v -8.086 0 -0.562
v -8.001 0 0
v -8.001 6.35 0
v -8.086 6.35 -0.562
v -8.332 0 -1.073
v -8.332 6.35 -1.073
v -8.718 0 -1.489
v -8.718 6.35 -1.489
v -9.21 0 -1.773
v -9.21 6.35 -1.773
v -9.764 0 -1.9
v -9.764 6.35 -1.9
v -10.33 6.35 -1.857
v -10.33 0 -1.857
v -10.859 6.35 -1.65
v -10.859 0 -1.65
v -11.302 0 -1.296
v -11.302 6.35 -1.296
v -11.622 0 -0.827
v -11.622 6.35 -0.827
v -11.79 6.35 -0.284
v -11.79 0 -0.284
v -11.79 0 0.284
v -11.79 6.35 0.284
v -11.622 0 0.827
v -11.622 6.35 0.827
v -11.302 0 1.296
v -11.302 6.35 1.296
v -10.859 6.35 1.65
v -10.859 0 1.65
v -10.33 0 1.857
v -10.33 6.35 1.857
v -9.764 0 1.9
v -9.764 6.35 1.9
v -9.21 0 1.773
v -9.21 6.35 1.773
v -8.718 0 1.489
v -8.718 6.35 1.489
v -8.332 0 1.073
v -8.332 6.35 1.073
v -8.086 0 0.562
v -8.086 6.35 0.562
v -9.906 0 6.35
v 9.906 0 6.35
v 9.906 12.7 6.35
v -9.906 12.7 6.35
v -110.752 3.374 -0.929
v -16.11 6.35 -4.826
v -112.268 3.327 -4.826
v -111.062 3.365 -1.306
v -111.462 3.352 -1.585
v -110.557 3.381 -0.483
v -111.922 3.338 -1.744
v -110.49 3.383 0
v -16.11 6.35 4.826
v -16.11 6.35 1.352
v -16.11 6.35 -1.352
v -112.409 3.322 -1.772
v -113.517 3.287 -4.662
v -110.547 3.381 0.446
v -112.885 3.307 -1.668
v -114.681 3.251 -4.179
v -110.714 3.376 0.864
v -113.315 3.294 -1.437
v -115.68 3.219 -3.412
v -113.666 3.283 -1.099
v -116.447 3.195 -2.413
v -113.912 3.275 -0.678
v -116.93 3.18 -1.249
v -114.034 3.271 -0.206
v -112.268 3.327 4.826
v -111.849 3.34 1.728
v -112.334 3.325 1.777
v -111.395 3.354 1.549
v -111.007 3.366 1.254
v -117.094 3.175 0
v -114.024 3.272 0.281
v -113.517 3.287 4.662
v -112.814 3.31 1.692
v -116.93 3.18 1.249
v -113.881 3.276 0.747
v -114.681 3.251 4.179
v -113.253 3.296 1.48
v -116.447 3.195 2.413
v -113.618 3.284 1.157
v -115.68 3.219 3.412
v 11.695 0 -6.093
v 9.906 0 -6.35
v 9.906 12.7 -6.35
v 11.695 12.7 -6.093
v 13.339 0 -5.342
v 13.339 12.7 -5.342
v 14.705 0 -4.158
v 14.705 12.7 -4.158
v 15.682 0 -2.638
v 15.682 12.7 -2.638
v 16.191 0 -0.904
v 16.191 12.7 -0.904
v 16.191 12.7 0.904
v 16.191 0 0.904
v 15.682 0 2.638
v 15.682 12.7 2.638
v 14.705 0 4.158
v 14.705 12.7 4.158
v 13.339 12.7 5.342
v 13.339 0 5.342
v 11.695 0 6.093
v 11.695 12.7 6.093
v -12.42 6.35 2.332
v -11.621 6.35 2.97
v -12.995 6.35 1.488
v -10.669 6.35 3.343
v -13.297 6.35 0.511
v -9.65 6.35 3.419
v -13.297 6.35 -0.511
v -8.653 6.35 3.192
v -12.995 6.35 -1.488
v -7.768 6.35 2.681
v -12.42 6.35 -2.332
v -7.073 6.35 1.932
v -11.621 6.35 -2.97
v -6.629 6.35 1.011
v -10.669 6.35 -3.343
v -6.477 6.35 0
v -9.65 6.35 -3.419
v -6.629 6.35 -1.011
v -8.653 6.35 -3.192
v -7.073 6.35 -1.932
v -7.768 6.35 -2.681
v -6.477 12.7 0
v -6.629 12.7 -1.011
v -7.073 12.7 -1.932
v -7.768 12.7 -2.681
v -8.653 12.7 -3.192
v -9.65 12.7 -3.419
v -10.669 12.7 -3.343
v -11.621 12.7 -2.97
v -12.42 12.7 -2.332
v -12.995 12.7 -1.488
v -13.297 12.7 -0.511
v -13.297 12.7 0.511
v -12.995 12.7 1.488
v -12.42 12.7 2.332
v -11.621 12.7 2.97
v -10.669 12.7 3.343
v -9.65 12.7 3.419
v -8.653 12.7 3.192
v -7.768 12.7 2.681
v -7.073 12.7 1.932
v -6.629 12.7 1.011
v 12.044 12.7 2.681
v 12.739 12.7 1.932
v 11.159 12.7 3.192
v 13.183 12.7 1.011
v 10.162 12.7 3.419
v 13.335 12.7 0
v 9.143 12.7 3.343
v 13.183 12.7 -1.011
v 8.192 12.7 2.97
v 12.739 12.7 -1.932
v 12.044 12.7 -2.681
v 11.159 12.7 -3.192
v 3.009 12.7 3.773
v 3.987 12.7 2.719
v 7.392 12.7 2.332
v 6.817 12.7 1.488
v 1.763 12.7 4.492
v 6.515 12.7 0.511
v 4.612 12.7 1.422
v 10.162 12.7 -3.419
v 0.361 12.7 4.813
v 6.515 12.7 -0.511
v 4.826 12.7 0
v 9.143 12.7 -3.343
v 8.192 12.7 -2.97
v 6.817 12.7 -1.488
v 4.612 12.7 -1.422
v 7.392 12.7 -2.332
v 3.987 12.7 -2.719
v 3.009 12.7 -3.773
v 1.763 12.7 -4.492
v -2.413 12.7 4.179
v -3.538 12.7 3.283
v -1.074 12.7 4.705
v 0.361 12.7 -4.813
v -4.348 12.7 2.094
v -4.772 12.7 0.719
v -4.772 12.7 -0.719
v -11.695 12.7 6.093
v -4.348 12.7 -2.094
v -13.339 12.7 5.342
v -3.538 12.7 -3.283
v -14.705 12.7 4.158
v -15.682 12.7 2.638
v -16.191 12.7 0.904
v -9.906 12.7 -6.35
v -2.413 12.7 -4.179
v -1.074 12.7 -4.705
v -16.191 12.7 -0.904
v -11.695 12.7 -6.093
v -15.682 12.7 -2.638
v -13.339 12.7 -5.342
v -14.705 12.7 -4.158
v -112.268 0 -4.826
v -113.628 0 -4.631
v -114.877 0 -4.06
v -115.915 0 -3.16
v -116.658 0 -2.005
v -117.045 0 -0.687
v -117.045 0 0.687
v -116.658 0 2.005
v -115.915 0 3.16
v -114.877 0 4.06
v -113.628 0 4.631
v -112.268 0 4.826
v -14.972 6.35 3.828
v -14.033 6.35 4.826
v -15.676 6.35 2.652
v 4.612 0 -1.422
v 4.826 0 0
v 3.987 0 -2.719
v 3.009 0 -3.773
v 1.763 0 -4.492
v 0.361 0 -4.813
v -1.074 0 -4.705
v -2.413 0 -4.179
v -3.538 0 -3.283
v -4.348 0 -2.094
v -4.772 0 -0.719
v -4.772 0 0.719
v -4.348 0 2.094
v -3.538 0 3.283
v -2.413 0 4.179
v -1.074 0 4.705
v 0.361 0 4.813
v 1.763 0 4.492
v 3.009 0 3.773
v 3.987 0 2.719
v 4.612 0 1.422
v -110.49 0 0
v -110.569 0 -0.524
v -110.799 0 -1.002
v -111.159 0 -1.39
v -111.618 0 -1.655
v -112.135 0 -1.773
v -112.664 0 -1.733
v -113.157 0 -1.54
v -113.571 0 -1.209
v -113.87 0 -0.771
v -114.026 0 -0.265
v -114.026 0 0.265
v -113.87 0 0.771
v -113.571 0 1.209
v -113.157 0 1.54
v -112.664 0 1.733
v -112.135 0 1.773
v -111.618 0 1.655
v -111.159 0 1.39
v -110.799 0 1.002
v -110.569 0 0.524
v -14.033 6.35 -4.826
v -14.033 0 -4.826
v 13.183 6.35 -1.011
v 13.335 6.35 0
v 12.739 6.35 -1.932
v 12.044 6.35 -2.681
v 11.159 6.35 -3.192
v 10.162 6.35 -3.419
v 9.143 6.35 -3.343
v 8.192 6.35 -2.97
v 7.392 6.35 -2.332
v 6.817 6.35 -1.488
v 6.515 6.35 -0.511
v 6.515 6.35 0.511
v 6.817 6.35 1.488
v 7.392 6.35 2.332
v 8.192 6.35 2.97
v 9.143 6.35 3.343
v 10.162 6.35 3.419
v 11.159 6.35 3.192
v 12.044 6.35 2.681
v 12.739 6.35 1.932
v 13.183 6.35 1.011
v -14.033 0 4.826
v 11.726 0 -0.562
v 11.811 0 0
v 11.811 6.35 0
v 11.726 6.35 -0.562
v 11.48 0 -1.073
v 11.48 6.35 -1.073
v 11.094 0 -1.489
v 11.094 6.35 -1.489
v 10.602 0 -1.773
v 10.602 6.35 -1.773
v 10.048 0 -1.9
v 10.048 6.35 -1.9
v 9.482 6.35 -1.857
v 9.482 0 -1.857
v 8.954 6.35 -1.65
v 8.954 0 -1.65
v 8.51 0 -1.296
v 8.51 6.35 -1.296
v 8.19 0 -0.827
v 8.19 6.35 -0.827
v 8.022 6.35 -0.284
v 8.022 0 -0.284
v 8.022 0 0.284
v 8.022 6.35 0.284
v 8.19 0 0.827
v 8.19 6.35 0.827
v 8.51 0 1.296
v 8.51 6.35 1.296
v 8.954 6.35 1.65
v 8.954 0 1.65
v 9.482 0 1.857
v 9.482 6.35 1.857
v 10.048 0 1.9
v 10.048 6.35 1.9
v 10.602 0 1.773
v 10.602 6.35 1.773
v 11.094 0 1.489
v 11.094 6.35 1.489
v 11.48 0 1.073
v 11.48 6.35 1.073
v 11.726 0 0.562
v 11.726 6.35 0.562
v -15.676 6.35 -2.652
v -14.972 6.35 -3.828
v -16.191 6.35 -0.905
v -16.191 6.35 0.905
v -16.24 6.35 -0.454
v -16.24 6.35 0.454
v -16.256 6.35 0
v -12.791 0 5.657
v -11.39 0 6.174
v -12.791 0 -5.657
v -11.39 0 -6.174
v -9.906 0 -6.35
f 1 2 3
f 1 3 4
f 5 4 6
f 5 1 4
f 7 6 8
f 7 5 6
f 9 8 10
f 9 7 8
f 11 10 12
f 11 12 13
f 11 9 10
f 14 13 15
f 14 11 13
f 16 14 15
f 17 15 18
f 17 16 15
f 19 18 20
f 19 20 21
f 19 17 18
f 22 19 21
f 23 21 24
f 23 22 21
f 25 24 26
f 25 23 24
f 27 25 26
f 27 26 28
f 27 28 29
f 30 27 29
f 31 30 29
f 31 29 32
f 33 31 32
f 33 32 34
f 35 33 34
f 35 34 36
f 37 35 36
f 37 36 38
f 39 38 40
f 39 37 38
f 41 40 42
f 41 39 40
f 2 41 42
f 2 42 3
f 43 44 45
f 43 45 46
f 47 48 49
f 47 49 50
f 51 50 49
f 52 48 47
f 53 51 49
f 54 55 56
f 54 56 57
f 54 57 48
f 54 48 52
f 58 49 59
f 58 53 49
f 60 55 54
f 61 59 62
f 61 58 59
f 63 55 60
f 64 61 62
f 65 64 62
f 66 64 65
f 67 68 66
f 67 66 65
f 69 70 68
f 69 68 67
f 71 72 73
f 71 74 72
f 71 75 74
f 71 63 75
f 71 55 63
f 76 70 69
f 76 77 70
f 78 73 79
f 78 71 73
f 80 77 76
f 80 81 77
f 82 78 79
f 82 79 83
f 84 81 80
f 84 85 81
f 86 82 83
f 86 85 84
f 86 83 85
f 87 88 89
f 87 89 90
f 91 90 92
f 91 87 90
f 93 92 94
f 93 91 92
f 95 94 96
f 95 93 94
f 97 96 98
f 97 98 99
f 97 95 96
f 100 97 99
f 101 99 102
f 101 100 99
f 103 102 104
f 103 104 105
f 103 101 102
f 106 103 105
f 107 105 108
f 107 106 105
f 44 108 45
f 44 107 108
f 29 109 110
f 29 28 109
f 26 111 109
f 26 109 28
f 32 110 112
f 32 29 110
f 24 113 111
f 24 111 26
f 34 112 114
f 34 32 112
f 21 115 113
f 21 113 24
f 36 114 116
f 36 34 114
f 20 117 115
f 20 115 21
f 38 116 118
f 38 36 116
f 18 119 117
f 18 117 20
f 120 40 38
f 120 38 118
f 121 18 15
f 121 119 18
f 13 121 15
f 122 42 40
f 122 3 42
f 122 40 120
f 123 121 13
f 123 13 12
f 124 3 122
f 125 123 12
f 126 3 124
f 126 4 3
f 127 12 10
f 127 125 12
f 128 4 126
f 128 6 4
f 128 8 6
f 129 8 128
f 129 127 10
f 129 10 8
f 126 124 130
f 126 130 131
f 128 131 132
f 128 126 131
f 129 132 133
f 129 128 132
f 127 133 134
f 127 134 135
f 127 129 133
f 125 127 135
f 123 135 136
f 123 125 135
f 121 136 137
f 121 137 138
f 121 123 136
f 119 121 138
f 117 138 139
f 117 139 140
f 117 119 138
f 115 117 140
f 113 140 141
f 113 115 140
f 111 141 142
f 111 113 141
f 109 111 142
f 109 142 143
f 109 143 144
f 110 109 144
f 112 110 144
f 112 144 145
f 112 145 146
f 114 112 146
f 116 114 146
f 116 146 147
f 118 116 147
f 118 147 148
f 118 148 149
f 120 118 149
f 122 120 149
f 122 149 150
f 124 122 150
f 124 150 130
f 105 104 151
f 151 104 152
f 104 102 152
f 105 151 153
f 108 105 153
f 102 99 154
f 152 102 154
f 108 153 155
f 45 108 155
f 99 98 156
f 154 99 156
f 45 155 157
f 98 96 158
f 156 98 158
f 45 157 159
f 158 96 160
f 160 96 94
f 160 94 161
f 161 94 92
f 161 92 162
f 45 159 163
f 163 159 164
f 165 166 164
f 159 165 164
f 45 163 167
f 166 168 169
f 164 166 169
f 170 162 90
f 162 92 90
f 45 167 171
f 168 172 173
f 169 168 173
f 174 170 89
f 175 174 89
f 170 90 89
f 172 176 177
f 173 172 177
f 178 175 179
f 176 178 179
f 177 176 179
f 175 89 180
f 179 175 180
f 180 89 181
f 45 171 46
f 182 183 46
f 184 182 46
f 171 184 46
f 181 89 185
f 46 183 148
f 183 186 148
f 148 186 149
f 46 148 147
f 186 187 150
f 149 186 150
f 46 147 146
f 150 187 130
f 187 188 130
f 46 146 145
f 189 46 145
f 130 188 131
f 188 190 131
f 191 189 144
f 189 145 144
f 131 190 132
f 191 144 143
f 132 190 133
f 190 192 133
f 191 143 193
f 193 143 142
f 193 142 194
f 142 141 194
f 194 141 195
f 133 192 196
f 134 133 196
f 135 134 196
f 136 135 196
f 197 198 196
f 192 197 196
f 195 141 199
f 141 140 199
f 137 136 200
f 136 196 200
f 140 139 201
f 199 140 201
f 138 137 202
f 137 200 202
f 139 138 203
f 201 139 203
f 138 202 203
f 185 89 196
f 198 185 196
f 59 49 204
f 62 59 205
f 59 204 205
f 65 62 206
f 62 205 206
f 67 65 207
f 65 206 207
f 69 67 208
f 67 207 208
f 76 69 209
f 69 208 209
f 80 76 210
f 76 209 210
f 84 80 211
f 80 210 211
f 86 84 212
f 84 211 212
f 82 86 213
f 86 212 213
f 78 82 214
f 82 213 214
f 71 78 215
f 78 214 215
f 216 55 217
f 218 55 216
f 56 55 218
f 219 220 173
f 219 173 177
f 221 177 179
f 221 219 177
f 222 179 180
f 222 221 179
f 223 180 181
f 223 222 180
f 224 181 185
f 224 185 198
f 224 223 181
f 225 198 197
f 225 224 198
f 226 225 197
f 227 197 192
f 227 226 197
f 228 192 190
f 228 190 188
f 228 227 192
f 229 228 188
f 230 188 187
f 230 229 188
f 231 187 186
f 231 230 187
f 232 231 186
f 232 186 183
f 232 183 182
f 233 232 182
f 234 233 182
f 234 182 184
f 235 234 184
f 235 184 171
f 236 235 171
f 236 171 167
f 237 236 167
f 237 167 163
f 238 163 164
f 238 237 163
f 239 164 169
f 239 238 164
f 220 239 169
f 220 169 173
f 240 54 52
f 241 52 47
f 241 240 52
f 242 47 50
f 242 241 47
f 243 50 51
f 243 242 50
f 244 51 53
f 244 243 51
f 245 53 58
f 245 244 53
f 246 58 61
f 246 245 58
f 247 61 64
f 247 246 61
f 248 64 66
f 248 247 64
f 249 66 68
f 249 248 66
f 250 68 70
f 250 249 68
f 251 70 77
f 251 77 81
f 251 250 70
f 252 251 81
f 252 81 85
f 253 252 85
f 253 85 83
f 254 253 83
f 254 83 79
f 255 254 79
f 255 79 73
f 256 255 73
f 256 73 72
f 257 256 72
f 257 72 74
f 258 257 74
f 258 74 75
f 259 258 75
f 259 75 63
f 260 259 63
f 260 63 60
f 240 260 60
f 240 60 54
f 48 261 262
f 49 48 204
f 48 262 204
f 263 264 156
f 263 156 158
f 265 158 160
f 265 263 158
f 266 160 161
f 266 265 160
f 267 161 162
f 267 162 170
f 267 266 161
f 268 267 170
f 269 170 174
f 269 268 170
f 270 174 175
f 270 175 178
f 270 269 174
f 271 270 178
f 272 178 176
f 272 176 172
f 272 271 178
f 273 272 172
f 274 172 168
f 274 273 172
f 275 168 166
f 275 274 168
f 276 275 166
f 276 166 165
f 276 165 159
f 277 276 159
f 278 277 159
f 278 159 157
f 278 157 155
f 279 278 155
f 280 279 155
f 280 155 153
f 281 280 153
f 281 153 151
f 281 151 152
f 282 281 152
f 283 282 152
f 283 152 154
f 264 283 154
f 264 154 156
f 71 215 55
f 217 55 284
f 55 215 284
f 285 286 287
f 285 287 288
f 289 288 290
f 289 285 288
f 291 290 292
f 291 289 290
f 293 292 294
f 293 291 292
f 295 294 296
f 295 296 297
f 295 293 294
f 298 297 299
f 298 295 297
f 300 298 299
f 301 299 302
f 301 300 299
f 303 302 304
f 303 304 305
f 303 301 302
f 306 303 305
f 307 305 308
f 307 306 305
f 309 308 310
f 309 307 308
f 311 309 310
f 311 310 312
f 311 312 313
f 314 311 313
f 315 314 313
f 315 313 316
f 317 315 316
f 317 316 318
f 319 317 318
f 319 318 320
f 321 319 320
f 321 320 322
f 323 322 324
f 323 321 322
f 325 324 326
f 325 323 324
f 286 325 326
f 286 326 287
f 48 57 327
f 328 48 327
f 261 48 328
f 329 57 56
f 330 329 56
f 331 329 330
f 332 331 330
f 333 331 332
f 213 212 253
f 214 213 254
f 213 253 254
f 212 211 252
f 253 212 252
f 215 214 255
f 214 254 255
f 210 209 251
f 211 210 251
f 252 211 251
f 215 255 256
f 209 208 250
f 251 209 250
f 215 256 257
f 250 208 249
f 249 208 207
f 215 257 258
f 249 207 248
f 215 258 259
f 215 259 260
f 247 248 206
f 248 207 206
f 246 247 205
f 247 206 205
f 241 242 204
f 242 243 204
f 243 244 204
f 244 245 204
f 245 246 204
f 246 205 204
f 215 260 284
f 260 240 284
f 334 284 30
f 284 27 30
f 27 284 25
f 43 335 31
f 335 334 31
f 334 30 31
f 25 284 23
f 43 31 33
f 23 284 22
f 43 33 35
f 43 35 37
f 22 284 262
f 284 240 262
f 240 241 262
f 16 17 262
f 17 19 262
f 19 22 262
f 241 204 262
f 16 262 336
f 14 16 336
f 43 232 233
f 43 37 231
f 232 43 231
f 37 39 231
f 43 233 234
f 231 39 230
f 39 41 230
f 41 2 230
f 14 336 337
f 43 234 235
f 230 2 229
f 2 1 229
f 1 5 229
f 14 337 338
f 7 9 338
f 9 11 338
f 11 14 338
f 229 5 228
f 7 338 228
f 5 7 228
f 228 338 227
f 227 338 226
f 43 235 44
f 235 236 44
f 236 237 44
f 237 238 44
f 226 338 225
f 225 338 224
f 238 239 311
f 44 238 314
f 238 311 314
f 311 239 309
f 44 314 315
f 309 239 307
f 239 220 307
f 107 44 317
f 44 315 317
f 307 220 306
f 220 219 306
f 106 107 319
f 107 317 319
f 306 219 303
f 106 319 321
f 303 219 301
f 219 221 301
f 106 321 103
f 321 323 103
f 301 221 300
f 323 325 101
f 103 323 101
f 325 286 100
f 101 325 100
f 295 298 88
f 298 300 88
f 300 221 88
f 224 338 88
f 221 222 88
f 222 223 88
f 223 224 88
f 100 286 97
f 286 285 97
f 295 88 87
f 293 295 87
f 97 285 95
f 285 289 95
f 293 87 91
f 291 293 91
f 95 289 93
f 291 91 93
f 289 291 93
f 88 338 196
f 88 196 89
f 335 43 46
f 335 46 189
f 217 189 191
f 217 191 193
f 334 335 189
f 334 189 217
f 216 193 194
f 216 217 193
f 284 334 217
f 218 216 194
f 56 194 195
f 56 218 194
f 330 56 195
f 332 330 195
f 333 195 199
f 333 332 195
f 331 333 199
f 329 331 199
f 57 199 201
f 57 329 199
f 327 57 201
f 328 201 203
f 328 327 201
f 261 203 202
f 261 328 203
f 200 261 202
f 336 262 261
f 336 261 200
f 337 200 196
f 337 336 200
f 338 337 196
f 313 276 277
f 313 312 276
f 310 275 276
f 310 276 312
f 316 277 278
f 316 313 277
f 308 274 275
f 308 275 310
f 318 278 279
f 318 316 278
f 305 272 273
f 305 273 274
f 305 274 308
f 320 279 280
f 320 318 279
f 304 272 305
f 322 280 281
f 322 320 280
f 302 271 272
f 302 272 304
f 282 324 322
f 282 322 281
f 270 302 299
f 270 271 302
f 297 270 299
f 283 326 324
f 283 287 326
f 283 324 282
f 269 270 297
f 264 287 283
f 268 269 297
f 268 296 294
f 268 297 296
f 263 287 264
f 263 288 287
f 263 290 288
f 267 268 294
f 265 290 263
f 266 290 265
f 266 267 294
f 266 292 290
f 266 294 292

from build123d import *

# Parameters (mm, degrees)
SKETCH1_R               = 4.826
SKETCH1_R_2             = 3.429
BOSS_EXTRUDE1_DEPTH     = 12.7
SKETCH2_R               = 3.429
SKETCH2_R_2             = 1.905
BOSS_EXTRUDE2_DEPTH     = 6.35
BOSS_EXTRUDE4_DEPTH     = 6.35
CUT_EXTRUDE1_DEPTH      = 7.35
CUT_EXTRUDE1_DEPTH_BACK = 7.35
SKETCH6_R               = 1.778
CUT_EXTRUDE2_DEPTH      = 6.35


with BuildPart() as part:
    # Sketch1 → Boss-Extrude1 (new body)
    with BuildSketch(Plane(origin=(0, 0, 0), x_dir=(1, 0, 0), z_dir=(0, 1, 0))):
        with BuildLine():
            Line((-9.906, 6.35), (9.906, 6.35))
            ThreePointArc((9.906, 6.35), (16.256, 0), (9.906, -6.35))
            Line((9.906, -6.35), (-9.906, -6.35))
            ThreePointArc((-9.906, -6.35), (-16.256, 0), (-9.906, 6.35))
        make_face()
        Circle(SKETCH1_R, mode=Mode.SUBTRACT)
        with Locations((9.906, 0)):
            Circle(SKETCH1_R_2, mode=Mode.SUBTRACT)
        with Locations((-9.906, 0)):
            Circle(SKETCH1_R_2, mode=Mode.SUBTRACT)
    extrude(amount=BOSS_EXTRUDE1_DEPTH)

    # Sketch2 → Boss-Extrude2 (add)
    with BuildSketch(Plane(origin=(0, 0, 0), x_dir=(1, 0, 0), z_dir=(0, 1, 0))):
        with Locations((-9.906, 0)):
            Circle(SKETCH2_R)
        with Locations((-9.906, 0)):
            Circle(SKETCH2_R_2, mode=Mode.SUBTRACT)
        with Locations((9.906, 0)):
            Circle(SKETCH2_R)
        with Locations((9.906, 0)):
            Circle(SKETCH2_R_2, mode=Mode.SUBTRACT)
    extrude(amount=BOSS_EXTRUDE2_DEPTH)

    # Sketch4 → Boss-Extrude4 (add)
    with BuildSketch(Plane(origin=(0, 0, 0), x_dir=(1, 0, 0), z_dir=(0, 1, 0))):
        with BuildLine():
            ThreePointArc((-14.03301151, -4.826), (-15.67353947, -2.656687497), (-16.256, 0))
            Line((-16.256, 0), (-112.268, 0))
            Line((-112.268, 0), (-112.268, -4.826))
            Line((-112.268, -4.826), (-14.03301151, -4.826))
        make_face()
        with BuildLine():
            Line((-112.268, 0), (-16.256, 0))
            ThreePointArc((-16.256, 0), (-15.67353947, 2.656687497), (-14.03301151, 4.826))
            Line((-14.03301151, 4.826), (-112.268, 4.826))
            ThreePointArc((-112.268, 4.826), (-117.094, 0), (-112.268, -4.826))
            Line((-112.268, -4.826), (-112.268, 0))
        make_face()
    extrude(amount=BOSS_EXTRUDE4_DEPTH)

    # Sketch5 → Cut-Extrude1 (cut, two sides)
    with BuildSketch(Plane.XY) as cut_extrude1_sk:
        Polygon((-117.094, 6.35), (-16.110356901, 6.35), (-117.094, 3.175), align=None)
    extrude(amount=CUT_EXTRUDE1_DEPTH, mode=Mode.SUBTRACT)
    extrude(cut_extrude1_sk.sketch, amount=-CUT_EXTRUDE1_DEPTH_BACK, mode=Mode.SUBTRACT)

    # Sketch6 → Cut-Extrude2 (cut)
    with BuildSketch(Plane(origin=(0, 0, 0), x_dir=(1, 0, 0), z_dir=(0, 1, 0))):
        with Locations((-112.268, 0)):
            Circle(SKETCH6_R)
    extrude(amount=CUT_EXTRUDE2_DEPTH, mode=Mode.SUBTRACT)


solid = part.part
